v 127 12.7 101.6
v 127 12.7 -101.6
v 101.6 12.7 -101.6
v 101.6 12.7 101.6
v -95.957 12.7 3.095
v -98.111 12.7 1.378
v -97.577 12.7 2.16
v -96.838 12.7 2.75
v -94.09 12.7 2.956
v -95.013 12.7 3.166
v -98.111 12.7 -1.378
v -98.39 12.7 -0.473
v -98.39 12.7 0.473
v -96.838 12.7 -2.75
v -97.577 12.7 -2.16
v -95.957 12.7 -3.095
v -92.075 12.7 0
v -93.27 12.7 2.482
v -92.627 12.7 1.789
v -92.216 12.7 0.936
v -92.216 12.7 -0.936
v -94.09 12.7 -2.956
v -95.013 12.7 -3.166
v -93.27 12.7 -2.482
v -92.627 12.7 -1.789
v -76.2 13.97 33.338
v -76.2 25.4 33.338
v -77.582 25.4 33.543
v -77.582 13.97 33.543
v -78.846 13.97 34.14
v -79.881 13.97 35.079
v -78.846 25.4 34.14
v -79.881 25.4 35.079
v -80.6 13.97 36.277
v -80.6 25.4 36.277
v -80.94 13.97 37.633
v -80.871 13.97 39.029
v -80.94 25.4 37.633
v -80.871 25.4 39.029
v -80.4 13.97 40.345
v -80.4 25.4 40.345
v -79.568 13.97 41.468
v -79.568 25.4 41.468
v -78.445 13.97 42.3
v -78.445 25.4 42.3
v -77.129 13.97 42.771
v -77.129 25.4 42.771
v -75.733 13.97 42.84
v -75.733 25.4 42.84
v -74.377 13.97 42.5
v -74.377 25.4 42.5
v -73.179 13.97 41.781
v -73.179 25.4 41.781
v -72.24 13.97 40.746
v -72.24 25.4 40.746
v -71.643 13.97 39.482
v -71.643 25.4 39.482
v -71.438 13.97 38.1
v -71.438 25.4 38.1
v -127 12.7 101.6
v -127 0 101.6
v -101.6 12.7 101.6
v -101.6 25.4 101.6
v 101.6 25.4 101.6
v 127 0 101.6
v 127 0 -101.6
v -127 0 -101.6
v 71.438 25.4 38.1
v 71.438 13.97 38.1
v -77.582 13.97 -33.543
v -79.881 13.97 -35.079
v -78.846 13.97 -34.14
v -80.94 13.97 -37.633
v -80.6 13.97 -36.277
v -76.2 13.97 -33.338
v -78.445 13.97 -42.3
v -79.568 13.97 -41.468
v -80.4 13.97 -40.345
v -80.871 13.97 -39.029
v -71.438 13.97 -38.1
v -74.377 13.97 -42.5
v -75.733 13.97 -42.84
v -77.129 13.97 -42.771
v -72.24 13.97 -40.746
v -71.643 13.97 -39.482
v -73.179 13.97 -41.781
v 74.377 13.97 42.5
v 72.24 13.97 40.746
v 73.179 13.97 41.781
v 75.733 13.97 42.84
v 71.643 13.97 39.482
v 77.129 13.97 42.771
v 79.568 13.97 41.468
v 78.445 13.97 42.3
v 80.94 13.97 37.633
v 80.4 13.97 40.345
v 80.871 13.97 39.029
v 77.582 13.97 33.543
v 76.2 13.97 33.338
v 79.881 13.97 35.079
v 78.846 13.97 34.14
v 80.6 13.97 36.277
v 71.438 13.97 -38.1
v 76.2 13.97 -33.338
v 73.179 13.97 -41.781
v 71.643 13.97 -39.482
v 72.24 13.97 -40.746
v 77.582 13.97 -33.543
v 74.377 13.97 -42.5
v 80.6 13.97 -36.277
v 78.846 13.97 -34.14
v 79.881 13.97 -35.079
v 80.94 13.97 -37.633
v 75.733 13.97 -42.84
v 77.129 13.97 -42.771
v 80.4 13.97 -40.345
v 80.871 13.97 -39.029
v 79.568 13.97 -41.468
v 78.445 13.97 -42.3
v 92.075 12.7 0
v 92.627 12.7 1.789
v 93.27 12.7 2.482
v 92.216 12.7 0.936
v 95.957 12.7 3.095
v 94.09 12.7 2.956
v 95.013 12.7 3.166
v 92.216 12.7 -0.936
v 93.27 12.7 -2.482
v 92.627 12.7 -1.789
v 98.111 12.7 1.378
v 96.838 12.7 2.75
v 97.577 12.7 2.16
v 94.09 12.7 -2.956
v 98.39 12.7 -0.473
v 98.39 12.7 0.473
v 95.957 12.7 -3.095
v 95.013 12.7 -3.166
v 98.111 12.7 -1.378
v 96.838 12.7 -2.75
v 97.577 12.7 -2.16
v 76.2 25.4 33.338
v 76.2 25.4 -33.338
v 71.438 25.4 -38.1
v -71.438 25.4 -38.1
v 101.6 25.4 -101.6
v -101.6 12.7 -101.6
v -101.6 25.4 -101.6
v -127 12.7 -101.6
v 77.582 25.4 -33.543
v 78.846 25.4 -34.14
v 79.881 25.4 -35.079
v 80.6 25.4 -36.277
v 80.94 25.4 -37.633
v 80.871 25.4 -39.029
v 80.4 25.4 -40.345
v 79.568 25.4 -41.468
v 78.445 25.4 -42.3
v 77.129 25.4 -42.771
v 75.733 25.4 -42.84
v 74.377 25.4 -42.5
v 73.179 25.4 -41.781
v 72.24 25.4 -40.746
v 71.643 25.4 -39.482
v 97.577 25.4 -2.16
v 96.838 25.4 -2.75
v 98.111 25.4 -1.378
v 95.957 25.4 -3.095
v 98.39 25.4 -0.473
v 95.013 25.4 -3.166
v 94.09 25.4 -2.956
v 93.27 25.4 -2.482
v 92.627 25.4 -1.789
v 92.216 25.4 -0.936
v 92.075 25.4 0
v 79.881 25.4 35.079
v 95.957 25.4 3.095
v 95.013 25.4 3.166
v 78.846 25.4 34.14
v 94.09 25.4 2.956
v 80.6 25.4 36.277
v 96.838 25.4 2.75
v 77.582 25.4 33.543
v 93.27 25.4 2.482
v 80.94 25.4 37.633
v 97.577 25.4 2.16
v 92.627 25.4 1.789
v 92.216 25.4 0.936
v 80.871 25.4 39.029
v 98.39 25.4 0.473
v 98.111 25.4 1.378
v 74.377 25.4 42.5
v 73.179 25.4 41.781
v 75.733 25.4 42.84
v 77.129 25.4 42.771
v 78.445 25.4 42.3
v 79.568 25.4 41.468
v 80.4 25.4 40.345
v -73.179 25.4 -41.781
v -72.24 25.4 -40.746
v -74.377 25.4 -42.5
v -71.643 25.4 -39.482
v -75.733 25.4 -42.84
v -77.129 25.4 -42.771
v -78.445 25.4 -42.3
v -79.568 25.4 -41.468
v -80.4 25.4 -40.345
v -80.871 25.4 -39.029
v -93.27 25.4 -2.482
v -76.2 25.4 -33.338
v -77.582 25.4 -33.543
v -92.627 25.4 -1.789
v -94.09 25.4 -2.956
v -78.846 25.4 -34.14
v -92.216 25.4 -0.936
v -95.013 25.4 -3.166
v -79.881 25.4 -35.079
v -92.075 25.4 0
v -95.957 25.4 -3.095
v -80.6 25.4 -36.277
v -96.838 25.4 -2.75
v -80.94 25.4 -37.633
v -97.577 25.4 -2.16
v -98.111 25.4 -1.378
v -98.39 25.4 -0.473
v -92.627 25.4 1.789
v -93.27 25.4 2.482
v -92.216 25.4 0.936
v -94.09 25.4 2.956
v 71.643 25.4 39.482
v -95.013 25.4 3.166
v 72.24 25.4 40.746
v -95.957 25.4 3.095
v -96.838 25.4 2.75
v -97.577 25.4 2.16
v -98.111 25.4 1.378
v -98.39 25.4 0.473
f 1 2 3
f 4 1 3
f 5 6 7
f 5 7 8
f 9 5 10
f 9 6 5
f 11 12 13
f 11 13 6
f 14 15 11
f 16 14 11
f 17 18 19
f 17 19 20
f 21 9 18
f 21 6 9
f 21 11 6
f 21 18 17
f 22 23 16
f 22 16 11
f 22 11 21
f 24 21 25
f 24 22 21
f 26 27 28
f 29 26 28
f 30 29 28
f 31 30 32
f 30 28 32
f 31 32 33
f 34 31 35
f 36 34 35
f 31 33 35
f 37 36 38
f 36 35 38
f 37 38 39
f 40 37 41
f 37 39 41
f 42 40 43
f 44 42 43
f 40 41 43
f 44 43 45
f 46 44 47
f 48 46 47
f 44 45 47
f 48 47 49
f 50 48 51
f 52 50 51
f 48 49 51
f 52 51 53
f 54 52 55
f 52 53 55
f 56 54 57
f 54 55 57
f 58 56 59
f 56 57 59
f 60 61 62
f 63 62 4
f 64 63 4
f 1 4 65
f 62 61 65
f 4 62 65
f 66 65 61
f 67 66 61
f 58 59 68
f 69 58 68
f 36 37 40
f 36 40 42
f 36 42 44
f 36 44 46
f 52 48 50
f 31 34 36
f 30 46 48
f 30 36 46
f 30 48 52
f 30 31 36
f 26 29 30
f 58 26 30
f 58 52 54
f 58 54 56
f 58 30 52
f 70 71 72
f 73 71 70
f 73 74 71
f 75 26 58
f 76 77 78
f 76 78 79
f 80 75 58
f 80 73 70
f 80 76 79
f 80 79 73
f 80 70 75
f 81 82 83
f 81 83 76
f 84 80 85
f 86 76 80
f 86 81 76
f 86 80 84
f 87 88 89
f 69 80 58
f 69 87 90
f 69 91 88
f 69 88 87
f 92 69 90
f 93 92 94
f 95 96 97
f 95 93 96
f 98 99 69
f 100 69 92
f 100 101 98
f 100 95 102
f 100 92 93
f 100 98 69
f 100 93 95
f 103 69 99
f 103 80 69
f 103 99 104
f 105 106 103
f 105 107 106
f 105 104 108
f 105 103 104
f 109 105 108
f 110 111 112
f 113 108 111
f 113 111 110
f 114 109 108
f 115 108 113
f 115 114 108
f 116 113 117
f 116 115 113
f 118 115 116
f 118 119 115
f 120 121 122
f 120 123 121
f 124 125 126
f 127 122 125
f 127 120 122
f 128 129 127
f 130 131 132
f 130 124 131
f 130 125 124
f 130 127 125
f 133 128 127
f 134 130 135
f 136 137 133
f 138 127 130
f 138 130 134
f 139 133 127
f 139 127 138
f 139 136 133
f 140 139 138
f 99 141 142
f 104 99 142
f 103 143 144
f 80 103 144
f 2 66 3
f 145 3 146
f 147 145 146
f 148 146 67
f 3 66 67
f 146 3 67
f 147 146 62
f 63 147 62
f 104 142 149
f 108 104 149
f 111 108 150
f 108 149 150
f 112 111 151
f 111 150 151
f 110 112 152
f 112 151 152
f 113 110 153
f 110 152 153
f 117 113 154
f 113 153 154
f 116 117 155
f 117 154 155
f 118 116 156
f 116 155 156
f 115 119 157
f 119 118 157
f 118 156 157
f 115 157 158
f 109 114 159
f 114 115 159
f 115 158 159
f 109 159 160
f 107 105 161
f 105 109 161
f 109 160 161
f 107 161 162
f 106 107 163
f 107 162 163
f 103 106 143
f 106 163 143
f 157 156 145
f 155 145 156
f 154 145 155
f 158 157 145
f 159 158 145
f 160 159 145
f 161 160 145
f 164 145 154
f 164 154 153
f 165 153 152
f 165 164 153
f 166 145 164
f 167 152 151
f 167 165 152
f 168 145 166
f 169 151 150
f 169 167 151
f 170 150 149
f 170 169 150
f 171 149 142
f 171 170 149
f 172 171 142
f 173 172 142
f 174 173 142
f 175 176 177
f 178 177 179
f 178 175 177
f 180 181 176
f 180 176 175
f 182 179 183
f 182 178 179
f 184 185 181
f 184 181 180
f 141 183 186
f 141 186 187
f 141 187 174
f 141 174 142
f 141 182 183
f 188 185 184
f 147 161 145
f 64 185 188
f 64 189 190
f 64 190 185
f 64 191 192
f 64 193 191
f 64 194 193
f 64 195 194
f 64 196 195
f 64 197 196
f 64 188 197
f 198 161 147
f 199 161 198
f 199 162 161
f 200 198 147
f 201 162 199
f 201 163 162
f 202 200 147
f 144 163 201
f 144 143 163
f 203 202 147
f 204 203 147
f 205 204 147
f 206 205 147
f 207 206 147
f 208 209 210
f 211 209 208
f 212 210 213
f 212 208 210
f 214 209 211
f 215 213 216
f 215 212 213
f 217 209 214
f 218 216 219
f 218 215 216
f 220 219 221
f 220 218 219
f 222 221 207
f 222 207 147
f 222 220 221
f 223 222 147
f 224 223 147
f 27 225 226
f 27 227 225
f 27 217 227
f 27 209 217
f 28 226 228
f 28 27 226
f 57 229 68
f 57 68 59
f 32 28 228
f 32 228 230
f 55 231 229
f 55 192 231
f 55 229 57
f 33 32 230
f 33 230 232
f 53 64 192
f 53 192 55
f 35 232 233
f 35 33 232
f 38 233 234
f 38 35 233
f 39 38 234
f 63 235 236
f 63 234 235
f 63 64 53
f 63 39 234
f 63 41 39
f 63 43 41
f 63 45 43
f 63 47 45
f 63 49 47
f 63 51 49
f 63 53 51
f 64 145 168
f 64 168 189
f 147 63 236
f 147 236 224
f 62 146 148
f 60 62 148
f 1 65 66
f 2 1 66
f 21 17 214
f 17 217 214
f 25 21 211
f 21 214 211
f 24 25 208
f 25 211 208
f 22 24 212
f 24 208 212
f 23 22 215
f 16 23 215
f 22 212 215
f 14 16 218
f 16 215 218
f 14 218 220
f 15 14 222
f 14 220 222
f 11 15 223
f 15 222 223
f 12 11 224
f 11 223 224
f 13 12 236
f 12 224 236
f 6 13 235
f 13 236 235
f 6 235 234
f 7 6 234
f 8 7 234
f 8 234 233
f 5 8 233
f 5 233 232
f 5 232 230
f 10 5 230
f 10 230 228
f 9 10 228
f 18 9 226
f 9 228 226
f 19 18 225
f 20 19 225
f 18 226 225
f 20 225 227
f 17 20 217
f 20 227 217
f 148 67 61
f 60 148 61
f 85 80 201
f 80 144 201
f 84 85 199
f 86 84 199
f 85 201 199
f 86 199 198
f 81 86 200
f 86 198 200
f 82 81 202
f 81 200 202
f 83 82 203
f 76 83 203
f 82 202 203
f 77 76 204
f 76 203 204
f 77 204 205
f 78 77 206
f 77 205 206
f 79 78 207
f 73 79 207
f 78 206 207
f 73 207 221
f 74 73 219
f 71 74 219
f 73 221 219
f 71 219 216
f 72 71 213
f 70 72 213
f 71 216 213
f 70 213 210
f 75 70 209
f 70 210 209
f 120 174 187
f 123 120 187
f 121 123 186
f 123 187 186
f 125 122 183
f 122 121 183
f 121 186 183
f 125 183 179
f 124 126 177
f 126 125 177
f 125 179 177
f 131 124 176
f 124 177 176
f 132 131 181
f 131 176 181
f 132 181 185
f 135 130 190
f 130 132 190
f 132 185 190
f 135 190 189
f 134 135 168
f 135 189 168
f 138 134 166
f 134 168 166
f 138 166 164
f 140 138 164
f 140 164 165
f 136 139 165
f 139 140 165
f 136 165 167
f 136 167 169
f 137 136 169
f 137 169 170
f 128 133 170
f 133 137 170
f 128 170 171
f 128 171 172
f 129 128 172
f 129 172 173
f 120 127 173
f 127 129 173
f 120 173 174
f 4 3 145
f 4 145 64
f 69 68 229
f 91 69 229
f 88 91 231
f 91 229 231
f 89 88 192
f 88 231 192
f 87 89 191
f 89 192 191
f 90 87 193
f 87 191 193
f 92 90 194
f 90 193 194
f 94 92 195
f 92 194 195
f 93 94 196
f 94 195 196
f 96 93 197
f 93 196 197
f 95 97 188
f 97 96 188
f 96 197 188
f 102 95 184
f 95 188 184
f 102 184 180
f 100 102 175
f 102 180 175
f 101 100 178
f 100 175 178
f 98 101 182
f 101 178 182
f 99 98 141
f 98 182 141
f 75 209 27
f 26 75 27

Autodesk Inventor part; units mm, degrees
ref_plane "YZ Plane" through (0, 0, 0) normal (1, 0, 0) x (0, 1, 0)
ref_plane "XZ Plane" through (0, 0, 0) normal (0, 1, 0) x (-1, 0, 0)
ref_plane "XY Plane" through (0, 0, 0) normal (0, 0, 1) x (1, 0, 0)
sketch "Sketch1" plane through (0, 0, 0) normal (0, 1, 0) x (-1, 0, 0)
  line L0 (127, 101.6) -> (101.6, 101.6)
  line L1 (-127, 101.6) -> (-127, -101.6)
  line L2 (-127, -101.6) -> (-101.6, -101.6)
  line L3 (127, -101.6) -> (127, 101.6)
  line L4 (127, 101.6) -> (-127, -101.6) construction
  line L5 (-127, 101.6) -> (127, -101.6) construction
  line L6 (127, -101.6) -> (101.6, -101.6)
  line L7 (101.6, -101.6) -> (101.6, 101.6)
  line L8 (101.6, 101.6) -> (127, 101.6)
  line L9 (127, 101.6) -> (127, -101.6)
  line L10 (-127, -101.6) -> (-101.6, -101.6)
  line L11 (-101.6, -101.6) -> (-101.6, 101.6)
  line L12 (-101.6, 101.6) -> (-127, 101.6)
  line L13 (-127, 101.6) -> (-127, -101.6)
  line L14 (101.6, -101.6) -> (127, -101.6)
  line L15 (101.6, 101.6) -> (-101.6, 101.6)
  line L16 (-101.6, 101.6) -> (-127, 101.6)
  line L17 (-101.6, -101.6) -> (101.6, -101.6)
  point P0 (0, 0)
  dimension "d0" = 254
  dimension "d1" = 203.2
  dimension "d2" = 25.4
  dimension "d3" = 25.4
extrude "Extrusion1" add sketch "Sketch1" along normal blind 25.4 contours L7 L17 L11 L15
extrude "Extrusion2" add sketch "Sketch1" along normal blind 12.7 contours L3 L6 L7 L0 | L11 L2 L1 L12
sketch "Sketch2" plane through (0, 25.4, 0) normal (0, 1, 0) x (1, 0, 0)
  line L0 (-76.2, -38.1) -> (76.2, -38.1)
  line L1 (76.2, -38.1) -> (76.2, 38.1)
  line L2 (76.2, 38.1) -> (-76.2, 38.1)
  line L3 (-76.2, 38.1) -> (-76.2, -38.1)
  line L4 (-76.2, -38.1) -> (76.2, 38.1) construction
  line L5 (76.2, -38.1) -> (-76.2, 38.1) construction
  circle A0 centre (-76.2, 38.1) radius 4.7625
  circle A1 centre (76.2, 38.1) radius 4.7625
  circle A2 centre (76.2, -38.1) radius 4.7625
  circle A3 centre (-76.2, -38.1) radius 4.7625
  point P0 (0, 0)
  dimension "d8" = 152.4
  dimension "d9" = 76.2
  dimension "d10" = 9.525
  dimension "d11" = 9.525
  dimension "d12" = 9.525
  dimension "d13" = 9.525
extrude "Extrusion3" cut sketch "Sketch2" against normal blind 11.43
sketch "Sketch3" plane through (0, 25.4, 0) normal (0, 1, 0) x (1, 0, 0)
  circle A0 centre (-95.25, 0) radius 3.175
  line L0 (-76.2, -33.3375) -> (-76.2, 33.3375) projected
  point P0 (0, 0)
  dimension "d16" = 6.35
  dimension "d17" = 19.05
extrude "Extrusion4" cut sketch "Sketch3" against normal blind 12.7
mirror "Mirror1" about plane through (0, 0, 0) normal (1, 0, 0) of "Extrusion4"
equation "\"d11\" = d10"
equation "\"d12\" = d10"
equation "\"d13\" = d10"
properties part number "Case Jig"
